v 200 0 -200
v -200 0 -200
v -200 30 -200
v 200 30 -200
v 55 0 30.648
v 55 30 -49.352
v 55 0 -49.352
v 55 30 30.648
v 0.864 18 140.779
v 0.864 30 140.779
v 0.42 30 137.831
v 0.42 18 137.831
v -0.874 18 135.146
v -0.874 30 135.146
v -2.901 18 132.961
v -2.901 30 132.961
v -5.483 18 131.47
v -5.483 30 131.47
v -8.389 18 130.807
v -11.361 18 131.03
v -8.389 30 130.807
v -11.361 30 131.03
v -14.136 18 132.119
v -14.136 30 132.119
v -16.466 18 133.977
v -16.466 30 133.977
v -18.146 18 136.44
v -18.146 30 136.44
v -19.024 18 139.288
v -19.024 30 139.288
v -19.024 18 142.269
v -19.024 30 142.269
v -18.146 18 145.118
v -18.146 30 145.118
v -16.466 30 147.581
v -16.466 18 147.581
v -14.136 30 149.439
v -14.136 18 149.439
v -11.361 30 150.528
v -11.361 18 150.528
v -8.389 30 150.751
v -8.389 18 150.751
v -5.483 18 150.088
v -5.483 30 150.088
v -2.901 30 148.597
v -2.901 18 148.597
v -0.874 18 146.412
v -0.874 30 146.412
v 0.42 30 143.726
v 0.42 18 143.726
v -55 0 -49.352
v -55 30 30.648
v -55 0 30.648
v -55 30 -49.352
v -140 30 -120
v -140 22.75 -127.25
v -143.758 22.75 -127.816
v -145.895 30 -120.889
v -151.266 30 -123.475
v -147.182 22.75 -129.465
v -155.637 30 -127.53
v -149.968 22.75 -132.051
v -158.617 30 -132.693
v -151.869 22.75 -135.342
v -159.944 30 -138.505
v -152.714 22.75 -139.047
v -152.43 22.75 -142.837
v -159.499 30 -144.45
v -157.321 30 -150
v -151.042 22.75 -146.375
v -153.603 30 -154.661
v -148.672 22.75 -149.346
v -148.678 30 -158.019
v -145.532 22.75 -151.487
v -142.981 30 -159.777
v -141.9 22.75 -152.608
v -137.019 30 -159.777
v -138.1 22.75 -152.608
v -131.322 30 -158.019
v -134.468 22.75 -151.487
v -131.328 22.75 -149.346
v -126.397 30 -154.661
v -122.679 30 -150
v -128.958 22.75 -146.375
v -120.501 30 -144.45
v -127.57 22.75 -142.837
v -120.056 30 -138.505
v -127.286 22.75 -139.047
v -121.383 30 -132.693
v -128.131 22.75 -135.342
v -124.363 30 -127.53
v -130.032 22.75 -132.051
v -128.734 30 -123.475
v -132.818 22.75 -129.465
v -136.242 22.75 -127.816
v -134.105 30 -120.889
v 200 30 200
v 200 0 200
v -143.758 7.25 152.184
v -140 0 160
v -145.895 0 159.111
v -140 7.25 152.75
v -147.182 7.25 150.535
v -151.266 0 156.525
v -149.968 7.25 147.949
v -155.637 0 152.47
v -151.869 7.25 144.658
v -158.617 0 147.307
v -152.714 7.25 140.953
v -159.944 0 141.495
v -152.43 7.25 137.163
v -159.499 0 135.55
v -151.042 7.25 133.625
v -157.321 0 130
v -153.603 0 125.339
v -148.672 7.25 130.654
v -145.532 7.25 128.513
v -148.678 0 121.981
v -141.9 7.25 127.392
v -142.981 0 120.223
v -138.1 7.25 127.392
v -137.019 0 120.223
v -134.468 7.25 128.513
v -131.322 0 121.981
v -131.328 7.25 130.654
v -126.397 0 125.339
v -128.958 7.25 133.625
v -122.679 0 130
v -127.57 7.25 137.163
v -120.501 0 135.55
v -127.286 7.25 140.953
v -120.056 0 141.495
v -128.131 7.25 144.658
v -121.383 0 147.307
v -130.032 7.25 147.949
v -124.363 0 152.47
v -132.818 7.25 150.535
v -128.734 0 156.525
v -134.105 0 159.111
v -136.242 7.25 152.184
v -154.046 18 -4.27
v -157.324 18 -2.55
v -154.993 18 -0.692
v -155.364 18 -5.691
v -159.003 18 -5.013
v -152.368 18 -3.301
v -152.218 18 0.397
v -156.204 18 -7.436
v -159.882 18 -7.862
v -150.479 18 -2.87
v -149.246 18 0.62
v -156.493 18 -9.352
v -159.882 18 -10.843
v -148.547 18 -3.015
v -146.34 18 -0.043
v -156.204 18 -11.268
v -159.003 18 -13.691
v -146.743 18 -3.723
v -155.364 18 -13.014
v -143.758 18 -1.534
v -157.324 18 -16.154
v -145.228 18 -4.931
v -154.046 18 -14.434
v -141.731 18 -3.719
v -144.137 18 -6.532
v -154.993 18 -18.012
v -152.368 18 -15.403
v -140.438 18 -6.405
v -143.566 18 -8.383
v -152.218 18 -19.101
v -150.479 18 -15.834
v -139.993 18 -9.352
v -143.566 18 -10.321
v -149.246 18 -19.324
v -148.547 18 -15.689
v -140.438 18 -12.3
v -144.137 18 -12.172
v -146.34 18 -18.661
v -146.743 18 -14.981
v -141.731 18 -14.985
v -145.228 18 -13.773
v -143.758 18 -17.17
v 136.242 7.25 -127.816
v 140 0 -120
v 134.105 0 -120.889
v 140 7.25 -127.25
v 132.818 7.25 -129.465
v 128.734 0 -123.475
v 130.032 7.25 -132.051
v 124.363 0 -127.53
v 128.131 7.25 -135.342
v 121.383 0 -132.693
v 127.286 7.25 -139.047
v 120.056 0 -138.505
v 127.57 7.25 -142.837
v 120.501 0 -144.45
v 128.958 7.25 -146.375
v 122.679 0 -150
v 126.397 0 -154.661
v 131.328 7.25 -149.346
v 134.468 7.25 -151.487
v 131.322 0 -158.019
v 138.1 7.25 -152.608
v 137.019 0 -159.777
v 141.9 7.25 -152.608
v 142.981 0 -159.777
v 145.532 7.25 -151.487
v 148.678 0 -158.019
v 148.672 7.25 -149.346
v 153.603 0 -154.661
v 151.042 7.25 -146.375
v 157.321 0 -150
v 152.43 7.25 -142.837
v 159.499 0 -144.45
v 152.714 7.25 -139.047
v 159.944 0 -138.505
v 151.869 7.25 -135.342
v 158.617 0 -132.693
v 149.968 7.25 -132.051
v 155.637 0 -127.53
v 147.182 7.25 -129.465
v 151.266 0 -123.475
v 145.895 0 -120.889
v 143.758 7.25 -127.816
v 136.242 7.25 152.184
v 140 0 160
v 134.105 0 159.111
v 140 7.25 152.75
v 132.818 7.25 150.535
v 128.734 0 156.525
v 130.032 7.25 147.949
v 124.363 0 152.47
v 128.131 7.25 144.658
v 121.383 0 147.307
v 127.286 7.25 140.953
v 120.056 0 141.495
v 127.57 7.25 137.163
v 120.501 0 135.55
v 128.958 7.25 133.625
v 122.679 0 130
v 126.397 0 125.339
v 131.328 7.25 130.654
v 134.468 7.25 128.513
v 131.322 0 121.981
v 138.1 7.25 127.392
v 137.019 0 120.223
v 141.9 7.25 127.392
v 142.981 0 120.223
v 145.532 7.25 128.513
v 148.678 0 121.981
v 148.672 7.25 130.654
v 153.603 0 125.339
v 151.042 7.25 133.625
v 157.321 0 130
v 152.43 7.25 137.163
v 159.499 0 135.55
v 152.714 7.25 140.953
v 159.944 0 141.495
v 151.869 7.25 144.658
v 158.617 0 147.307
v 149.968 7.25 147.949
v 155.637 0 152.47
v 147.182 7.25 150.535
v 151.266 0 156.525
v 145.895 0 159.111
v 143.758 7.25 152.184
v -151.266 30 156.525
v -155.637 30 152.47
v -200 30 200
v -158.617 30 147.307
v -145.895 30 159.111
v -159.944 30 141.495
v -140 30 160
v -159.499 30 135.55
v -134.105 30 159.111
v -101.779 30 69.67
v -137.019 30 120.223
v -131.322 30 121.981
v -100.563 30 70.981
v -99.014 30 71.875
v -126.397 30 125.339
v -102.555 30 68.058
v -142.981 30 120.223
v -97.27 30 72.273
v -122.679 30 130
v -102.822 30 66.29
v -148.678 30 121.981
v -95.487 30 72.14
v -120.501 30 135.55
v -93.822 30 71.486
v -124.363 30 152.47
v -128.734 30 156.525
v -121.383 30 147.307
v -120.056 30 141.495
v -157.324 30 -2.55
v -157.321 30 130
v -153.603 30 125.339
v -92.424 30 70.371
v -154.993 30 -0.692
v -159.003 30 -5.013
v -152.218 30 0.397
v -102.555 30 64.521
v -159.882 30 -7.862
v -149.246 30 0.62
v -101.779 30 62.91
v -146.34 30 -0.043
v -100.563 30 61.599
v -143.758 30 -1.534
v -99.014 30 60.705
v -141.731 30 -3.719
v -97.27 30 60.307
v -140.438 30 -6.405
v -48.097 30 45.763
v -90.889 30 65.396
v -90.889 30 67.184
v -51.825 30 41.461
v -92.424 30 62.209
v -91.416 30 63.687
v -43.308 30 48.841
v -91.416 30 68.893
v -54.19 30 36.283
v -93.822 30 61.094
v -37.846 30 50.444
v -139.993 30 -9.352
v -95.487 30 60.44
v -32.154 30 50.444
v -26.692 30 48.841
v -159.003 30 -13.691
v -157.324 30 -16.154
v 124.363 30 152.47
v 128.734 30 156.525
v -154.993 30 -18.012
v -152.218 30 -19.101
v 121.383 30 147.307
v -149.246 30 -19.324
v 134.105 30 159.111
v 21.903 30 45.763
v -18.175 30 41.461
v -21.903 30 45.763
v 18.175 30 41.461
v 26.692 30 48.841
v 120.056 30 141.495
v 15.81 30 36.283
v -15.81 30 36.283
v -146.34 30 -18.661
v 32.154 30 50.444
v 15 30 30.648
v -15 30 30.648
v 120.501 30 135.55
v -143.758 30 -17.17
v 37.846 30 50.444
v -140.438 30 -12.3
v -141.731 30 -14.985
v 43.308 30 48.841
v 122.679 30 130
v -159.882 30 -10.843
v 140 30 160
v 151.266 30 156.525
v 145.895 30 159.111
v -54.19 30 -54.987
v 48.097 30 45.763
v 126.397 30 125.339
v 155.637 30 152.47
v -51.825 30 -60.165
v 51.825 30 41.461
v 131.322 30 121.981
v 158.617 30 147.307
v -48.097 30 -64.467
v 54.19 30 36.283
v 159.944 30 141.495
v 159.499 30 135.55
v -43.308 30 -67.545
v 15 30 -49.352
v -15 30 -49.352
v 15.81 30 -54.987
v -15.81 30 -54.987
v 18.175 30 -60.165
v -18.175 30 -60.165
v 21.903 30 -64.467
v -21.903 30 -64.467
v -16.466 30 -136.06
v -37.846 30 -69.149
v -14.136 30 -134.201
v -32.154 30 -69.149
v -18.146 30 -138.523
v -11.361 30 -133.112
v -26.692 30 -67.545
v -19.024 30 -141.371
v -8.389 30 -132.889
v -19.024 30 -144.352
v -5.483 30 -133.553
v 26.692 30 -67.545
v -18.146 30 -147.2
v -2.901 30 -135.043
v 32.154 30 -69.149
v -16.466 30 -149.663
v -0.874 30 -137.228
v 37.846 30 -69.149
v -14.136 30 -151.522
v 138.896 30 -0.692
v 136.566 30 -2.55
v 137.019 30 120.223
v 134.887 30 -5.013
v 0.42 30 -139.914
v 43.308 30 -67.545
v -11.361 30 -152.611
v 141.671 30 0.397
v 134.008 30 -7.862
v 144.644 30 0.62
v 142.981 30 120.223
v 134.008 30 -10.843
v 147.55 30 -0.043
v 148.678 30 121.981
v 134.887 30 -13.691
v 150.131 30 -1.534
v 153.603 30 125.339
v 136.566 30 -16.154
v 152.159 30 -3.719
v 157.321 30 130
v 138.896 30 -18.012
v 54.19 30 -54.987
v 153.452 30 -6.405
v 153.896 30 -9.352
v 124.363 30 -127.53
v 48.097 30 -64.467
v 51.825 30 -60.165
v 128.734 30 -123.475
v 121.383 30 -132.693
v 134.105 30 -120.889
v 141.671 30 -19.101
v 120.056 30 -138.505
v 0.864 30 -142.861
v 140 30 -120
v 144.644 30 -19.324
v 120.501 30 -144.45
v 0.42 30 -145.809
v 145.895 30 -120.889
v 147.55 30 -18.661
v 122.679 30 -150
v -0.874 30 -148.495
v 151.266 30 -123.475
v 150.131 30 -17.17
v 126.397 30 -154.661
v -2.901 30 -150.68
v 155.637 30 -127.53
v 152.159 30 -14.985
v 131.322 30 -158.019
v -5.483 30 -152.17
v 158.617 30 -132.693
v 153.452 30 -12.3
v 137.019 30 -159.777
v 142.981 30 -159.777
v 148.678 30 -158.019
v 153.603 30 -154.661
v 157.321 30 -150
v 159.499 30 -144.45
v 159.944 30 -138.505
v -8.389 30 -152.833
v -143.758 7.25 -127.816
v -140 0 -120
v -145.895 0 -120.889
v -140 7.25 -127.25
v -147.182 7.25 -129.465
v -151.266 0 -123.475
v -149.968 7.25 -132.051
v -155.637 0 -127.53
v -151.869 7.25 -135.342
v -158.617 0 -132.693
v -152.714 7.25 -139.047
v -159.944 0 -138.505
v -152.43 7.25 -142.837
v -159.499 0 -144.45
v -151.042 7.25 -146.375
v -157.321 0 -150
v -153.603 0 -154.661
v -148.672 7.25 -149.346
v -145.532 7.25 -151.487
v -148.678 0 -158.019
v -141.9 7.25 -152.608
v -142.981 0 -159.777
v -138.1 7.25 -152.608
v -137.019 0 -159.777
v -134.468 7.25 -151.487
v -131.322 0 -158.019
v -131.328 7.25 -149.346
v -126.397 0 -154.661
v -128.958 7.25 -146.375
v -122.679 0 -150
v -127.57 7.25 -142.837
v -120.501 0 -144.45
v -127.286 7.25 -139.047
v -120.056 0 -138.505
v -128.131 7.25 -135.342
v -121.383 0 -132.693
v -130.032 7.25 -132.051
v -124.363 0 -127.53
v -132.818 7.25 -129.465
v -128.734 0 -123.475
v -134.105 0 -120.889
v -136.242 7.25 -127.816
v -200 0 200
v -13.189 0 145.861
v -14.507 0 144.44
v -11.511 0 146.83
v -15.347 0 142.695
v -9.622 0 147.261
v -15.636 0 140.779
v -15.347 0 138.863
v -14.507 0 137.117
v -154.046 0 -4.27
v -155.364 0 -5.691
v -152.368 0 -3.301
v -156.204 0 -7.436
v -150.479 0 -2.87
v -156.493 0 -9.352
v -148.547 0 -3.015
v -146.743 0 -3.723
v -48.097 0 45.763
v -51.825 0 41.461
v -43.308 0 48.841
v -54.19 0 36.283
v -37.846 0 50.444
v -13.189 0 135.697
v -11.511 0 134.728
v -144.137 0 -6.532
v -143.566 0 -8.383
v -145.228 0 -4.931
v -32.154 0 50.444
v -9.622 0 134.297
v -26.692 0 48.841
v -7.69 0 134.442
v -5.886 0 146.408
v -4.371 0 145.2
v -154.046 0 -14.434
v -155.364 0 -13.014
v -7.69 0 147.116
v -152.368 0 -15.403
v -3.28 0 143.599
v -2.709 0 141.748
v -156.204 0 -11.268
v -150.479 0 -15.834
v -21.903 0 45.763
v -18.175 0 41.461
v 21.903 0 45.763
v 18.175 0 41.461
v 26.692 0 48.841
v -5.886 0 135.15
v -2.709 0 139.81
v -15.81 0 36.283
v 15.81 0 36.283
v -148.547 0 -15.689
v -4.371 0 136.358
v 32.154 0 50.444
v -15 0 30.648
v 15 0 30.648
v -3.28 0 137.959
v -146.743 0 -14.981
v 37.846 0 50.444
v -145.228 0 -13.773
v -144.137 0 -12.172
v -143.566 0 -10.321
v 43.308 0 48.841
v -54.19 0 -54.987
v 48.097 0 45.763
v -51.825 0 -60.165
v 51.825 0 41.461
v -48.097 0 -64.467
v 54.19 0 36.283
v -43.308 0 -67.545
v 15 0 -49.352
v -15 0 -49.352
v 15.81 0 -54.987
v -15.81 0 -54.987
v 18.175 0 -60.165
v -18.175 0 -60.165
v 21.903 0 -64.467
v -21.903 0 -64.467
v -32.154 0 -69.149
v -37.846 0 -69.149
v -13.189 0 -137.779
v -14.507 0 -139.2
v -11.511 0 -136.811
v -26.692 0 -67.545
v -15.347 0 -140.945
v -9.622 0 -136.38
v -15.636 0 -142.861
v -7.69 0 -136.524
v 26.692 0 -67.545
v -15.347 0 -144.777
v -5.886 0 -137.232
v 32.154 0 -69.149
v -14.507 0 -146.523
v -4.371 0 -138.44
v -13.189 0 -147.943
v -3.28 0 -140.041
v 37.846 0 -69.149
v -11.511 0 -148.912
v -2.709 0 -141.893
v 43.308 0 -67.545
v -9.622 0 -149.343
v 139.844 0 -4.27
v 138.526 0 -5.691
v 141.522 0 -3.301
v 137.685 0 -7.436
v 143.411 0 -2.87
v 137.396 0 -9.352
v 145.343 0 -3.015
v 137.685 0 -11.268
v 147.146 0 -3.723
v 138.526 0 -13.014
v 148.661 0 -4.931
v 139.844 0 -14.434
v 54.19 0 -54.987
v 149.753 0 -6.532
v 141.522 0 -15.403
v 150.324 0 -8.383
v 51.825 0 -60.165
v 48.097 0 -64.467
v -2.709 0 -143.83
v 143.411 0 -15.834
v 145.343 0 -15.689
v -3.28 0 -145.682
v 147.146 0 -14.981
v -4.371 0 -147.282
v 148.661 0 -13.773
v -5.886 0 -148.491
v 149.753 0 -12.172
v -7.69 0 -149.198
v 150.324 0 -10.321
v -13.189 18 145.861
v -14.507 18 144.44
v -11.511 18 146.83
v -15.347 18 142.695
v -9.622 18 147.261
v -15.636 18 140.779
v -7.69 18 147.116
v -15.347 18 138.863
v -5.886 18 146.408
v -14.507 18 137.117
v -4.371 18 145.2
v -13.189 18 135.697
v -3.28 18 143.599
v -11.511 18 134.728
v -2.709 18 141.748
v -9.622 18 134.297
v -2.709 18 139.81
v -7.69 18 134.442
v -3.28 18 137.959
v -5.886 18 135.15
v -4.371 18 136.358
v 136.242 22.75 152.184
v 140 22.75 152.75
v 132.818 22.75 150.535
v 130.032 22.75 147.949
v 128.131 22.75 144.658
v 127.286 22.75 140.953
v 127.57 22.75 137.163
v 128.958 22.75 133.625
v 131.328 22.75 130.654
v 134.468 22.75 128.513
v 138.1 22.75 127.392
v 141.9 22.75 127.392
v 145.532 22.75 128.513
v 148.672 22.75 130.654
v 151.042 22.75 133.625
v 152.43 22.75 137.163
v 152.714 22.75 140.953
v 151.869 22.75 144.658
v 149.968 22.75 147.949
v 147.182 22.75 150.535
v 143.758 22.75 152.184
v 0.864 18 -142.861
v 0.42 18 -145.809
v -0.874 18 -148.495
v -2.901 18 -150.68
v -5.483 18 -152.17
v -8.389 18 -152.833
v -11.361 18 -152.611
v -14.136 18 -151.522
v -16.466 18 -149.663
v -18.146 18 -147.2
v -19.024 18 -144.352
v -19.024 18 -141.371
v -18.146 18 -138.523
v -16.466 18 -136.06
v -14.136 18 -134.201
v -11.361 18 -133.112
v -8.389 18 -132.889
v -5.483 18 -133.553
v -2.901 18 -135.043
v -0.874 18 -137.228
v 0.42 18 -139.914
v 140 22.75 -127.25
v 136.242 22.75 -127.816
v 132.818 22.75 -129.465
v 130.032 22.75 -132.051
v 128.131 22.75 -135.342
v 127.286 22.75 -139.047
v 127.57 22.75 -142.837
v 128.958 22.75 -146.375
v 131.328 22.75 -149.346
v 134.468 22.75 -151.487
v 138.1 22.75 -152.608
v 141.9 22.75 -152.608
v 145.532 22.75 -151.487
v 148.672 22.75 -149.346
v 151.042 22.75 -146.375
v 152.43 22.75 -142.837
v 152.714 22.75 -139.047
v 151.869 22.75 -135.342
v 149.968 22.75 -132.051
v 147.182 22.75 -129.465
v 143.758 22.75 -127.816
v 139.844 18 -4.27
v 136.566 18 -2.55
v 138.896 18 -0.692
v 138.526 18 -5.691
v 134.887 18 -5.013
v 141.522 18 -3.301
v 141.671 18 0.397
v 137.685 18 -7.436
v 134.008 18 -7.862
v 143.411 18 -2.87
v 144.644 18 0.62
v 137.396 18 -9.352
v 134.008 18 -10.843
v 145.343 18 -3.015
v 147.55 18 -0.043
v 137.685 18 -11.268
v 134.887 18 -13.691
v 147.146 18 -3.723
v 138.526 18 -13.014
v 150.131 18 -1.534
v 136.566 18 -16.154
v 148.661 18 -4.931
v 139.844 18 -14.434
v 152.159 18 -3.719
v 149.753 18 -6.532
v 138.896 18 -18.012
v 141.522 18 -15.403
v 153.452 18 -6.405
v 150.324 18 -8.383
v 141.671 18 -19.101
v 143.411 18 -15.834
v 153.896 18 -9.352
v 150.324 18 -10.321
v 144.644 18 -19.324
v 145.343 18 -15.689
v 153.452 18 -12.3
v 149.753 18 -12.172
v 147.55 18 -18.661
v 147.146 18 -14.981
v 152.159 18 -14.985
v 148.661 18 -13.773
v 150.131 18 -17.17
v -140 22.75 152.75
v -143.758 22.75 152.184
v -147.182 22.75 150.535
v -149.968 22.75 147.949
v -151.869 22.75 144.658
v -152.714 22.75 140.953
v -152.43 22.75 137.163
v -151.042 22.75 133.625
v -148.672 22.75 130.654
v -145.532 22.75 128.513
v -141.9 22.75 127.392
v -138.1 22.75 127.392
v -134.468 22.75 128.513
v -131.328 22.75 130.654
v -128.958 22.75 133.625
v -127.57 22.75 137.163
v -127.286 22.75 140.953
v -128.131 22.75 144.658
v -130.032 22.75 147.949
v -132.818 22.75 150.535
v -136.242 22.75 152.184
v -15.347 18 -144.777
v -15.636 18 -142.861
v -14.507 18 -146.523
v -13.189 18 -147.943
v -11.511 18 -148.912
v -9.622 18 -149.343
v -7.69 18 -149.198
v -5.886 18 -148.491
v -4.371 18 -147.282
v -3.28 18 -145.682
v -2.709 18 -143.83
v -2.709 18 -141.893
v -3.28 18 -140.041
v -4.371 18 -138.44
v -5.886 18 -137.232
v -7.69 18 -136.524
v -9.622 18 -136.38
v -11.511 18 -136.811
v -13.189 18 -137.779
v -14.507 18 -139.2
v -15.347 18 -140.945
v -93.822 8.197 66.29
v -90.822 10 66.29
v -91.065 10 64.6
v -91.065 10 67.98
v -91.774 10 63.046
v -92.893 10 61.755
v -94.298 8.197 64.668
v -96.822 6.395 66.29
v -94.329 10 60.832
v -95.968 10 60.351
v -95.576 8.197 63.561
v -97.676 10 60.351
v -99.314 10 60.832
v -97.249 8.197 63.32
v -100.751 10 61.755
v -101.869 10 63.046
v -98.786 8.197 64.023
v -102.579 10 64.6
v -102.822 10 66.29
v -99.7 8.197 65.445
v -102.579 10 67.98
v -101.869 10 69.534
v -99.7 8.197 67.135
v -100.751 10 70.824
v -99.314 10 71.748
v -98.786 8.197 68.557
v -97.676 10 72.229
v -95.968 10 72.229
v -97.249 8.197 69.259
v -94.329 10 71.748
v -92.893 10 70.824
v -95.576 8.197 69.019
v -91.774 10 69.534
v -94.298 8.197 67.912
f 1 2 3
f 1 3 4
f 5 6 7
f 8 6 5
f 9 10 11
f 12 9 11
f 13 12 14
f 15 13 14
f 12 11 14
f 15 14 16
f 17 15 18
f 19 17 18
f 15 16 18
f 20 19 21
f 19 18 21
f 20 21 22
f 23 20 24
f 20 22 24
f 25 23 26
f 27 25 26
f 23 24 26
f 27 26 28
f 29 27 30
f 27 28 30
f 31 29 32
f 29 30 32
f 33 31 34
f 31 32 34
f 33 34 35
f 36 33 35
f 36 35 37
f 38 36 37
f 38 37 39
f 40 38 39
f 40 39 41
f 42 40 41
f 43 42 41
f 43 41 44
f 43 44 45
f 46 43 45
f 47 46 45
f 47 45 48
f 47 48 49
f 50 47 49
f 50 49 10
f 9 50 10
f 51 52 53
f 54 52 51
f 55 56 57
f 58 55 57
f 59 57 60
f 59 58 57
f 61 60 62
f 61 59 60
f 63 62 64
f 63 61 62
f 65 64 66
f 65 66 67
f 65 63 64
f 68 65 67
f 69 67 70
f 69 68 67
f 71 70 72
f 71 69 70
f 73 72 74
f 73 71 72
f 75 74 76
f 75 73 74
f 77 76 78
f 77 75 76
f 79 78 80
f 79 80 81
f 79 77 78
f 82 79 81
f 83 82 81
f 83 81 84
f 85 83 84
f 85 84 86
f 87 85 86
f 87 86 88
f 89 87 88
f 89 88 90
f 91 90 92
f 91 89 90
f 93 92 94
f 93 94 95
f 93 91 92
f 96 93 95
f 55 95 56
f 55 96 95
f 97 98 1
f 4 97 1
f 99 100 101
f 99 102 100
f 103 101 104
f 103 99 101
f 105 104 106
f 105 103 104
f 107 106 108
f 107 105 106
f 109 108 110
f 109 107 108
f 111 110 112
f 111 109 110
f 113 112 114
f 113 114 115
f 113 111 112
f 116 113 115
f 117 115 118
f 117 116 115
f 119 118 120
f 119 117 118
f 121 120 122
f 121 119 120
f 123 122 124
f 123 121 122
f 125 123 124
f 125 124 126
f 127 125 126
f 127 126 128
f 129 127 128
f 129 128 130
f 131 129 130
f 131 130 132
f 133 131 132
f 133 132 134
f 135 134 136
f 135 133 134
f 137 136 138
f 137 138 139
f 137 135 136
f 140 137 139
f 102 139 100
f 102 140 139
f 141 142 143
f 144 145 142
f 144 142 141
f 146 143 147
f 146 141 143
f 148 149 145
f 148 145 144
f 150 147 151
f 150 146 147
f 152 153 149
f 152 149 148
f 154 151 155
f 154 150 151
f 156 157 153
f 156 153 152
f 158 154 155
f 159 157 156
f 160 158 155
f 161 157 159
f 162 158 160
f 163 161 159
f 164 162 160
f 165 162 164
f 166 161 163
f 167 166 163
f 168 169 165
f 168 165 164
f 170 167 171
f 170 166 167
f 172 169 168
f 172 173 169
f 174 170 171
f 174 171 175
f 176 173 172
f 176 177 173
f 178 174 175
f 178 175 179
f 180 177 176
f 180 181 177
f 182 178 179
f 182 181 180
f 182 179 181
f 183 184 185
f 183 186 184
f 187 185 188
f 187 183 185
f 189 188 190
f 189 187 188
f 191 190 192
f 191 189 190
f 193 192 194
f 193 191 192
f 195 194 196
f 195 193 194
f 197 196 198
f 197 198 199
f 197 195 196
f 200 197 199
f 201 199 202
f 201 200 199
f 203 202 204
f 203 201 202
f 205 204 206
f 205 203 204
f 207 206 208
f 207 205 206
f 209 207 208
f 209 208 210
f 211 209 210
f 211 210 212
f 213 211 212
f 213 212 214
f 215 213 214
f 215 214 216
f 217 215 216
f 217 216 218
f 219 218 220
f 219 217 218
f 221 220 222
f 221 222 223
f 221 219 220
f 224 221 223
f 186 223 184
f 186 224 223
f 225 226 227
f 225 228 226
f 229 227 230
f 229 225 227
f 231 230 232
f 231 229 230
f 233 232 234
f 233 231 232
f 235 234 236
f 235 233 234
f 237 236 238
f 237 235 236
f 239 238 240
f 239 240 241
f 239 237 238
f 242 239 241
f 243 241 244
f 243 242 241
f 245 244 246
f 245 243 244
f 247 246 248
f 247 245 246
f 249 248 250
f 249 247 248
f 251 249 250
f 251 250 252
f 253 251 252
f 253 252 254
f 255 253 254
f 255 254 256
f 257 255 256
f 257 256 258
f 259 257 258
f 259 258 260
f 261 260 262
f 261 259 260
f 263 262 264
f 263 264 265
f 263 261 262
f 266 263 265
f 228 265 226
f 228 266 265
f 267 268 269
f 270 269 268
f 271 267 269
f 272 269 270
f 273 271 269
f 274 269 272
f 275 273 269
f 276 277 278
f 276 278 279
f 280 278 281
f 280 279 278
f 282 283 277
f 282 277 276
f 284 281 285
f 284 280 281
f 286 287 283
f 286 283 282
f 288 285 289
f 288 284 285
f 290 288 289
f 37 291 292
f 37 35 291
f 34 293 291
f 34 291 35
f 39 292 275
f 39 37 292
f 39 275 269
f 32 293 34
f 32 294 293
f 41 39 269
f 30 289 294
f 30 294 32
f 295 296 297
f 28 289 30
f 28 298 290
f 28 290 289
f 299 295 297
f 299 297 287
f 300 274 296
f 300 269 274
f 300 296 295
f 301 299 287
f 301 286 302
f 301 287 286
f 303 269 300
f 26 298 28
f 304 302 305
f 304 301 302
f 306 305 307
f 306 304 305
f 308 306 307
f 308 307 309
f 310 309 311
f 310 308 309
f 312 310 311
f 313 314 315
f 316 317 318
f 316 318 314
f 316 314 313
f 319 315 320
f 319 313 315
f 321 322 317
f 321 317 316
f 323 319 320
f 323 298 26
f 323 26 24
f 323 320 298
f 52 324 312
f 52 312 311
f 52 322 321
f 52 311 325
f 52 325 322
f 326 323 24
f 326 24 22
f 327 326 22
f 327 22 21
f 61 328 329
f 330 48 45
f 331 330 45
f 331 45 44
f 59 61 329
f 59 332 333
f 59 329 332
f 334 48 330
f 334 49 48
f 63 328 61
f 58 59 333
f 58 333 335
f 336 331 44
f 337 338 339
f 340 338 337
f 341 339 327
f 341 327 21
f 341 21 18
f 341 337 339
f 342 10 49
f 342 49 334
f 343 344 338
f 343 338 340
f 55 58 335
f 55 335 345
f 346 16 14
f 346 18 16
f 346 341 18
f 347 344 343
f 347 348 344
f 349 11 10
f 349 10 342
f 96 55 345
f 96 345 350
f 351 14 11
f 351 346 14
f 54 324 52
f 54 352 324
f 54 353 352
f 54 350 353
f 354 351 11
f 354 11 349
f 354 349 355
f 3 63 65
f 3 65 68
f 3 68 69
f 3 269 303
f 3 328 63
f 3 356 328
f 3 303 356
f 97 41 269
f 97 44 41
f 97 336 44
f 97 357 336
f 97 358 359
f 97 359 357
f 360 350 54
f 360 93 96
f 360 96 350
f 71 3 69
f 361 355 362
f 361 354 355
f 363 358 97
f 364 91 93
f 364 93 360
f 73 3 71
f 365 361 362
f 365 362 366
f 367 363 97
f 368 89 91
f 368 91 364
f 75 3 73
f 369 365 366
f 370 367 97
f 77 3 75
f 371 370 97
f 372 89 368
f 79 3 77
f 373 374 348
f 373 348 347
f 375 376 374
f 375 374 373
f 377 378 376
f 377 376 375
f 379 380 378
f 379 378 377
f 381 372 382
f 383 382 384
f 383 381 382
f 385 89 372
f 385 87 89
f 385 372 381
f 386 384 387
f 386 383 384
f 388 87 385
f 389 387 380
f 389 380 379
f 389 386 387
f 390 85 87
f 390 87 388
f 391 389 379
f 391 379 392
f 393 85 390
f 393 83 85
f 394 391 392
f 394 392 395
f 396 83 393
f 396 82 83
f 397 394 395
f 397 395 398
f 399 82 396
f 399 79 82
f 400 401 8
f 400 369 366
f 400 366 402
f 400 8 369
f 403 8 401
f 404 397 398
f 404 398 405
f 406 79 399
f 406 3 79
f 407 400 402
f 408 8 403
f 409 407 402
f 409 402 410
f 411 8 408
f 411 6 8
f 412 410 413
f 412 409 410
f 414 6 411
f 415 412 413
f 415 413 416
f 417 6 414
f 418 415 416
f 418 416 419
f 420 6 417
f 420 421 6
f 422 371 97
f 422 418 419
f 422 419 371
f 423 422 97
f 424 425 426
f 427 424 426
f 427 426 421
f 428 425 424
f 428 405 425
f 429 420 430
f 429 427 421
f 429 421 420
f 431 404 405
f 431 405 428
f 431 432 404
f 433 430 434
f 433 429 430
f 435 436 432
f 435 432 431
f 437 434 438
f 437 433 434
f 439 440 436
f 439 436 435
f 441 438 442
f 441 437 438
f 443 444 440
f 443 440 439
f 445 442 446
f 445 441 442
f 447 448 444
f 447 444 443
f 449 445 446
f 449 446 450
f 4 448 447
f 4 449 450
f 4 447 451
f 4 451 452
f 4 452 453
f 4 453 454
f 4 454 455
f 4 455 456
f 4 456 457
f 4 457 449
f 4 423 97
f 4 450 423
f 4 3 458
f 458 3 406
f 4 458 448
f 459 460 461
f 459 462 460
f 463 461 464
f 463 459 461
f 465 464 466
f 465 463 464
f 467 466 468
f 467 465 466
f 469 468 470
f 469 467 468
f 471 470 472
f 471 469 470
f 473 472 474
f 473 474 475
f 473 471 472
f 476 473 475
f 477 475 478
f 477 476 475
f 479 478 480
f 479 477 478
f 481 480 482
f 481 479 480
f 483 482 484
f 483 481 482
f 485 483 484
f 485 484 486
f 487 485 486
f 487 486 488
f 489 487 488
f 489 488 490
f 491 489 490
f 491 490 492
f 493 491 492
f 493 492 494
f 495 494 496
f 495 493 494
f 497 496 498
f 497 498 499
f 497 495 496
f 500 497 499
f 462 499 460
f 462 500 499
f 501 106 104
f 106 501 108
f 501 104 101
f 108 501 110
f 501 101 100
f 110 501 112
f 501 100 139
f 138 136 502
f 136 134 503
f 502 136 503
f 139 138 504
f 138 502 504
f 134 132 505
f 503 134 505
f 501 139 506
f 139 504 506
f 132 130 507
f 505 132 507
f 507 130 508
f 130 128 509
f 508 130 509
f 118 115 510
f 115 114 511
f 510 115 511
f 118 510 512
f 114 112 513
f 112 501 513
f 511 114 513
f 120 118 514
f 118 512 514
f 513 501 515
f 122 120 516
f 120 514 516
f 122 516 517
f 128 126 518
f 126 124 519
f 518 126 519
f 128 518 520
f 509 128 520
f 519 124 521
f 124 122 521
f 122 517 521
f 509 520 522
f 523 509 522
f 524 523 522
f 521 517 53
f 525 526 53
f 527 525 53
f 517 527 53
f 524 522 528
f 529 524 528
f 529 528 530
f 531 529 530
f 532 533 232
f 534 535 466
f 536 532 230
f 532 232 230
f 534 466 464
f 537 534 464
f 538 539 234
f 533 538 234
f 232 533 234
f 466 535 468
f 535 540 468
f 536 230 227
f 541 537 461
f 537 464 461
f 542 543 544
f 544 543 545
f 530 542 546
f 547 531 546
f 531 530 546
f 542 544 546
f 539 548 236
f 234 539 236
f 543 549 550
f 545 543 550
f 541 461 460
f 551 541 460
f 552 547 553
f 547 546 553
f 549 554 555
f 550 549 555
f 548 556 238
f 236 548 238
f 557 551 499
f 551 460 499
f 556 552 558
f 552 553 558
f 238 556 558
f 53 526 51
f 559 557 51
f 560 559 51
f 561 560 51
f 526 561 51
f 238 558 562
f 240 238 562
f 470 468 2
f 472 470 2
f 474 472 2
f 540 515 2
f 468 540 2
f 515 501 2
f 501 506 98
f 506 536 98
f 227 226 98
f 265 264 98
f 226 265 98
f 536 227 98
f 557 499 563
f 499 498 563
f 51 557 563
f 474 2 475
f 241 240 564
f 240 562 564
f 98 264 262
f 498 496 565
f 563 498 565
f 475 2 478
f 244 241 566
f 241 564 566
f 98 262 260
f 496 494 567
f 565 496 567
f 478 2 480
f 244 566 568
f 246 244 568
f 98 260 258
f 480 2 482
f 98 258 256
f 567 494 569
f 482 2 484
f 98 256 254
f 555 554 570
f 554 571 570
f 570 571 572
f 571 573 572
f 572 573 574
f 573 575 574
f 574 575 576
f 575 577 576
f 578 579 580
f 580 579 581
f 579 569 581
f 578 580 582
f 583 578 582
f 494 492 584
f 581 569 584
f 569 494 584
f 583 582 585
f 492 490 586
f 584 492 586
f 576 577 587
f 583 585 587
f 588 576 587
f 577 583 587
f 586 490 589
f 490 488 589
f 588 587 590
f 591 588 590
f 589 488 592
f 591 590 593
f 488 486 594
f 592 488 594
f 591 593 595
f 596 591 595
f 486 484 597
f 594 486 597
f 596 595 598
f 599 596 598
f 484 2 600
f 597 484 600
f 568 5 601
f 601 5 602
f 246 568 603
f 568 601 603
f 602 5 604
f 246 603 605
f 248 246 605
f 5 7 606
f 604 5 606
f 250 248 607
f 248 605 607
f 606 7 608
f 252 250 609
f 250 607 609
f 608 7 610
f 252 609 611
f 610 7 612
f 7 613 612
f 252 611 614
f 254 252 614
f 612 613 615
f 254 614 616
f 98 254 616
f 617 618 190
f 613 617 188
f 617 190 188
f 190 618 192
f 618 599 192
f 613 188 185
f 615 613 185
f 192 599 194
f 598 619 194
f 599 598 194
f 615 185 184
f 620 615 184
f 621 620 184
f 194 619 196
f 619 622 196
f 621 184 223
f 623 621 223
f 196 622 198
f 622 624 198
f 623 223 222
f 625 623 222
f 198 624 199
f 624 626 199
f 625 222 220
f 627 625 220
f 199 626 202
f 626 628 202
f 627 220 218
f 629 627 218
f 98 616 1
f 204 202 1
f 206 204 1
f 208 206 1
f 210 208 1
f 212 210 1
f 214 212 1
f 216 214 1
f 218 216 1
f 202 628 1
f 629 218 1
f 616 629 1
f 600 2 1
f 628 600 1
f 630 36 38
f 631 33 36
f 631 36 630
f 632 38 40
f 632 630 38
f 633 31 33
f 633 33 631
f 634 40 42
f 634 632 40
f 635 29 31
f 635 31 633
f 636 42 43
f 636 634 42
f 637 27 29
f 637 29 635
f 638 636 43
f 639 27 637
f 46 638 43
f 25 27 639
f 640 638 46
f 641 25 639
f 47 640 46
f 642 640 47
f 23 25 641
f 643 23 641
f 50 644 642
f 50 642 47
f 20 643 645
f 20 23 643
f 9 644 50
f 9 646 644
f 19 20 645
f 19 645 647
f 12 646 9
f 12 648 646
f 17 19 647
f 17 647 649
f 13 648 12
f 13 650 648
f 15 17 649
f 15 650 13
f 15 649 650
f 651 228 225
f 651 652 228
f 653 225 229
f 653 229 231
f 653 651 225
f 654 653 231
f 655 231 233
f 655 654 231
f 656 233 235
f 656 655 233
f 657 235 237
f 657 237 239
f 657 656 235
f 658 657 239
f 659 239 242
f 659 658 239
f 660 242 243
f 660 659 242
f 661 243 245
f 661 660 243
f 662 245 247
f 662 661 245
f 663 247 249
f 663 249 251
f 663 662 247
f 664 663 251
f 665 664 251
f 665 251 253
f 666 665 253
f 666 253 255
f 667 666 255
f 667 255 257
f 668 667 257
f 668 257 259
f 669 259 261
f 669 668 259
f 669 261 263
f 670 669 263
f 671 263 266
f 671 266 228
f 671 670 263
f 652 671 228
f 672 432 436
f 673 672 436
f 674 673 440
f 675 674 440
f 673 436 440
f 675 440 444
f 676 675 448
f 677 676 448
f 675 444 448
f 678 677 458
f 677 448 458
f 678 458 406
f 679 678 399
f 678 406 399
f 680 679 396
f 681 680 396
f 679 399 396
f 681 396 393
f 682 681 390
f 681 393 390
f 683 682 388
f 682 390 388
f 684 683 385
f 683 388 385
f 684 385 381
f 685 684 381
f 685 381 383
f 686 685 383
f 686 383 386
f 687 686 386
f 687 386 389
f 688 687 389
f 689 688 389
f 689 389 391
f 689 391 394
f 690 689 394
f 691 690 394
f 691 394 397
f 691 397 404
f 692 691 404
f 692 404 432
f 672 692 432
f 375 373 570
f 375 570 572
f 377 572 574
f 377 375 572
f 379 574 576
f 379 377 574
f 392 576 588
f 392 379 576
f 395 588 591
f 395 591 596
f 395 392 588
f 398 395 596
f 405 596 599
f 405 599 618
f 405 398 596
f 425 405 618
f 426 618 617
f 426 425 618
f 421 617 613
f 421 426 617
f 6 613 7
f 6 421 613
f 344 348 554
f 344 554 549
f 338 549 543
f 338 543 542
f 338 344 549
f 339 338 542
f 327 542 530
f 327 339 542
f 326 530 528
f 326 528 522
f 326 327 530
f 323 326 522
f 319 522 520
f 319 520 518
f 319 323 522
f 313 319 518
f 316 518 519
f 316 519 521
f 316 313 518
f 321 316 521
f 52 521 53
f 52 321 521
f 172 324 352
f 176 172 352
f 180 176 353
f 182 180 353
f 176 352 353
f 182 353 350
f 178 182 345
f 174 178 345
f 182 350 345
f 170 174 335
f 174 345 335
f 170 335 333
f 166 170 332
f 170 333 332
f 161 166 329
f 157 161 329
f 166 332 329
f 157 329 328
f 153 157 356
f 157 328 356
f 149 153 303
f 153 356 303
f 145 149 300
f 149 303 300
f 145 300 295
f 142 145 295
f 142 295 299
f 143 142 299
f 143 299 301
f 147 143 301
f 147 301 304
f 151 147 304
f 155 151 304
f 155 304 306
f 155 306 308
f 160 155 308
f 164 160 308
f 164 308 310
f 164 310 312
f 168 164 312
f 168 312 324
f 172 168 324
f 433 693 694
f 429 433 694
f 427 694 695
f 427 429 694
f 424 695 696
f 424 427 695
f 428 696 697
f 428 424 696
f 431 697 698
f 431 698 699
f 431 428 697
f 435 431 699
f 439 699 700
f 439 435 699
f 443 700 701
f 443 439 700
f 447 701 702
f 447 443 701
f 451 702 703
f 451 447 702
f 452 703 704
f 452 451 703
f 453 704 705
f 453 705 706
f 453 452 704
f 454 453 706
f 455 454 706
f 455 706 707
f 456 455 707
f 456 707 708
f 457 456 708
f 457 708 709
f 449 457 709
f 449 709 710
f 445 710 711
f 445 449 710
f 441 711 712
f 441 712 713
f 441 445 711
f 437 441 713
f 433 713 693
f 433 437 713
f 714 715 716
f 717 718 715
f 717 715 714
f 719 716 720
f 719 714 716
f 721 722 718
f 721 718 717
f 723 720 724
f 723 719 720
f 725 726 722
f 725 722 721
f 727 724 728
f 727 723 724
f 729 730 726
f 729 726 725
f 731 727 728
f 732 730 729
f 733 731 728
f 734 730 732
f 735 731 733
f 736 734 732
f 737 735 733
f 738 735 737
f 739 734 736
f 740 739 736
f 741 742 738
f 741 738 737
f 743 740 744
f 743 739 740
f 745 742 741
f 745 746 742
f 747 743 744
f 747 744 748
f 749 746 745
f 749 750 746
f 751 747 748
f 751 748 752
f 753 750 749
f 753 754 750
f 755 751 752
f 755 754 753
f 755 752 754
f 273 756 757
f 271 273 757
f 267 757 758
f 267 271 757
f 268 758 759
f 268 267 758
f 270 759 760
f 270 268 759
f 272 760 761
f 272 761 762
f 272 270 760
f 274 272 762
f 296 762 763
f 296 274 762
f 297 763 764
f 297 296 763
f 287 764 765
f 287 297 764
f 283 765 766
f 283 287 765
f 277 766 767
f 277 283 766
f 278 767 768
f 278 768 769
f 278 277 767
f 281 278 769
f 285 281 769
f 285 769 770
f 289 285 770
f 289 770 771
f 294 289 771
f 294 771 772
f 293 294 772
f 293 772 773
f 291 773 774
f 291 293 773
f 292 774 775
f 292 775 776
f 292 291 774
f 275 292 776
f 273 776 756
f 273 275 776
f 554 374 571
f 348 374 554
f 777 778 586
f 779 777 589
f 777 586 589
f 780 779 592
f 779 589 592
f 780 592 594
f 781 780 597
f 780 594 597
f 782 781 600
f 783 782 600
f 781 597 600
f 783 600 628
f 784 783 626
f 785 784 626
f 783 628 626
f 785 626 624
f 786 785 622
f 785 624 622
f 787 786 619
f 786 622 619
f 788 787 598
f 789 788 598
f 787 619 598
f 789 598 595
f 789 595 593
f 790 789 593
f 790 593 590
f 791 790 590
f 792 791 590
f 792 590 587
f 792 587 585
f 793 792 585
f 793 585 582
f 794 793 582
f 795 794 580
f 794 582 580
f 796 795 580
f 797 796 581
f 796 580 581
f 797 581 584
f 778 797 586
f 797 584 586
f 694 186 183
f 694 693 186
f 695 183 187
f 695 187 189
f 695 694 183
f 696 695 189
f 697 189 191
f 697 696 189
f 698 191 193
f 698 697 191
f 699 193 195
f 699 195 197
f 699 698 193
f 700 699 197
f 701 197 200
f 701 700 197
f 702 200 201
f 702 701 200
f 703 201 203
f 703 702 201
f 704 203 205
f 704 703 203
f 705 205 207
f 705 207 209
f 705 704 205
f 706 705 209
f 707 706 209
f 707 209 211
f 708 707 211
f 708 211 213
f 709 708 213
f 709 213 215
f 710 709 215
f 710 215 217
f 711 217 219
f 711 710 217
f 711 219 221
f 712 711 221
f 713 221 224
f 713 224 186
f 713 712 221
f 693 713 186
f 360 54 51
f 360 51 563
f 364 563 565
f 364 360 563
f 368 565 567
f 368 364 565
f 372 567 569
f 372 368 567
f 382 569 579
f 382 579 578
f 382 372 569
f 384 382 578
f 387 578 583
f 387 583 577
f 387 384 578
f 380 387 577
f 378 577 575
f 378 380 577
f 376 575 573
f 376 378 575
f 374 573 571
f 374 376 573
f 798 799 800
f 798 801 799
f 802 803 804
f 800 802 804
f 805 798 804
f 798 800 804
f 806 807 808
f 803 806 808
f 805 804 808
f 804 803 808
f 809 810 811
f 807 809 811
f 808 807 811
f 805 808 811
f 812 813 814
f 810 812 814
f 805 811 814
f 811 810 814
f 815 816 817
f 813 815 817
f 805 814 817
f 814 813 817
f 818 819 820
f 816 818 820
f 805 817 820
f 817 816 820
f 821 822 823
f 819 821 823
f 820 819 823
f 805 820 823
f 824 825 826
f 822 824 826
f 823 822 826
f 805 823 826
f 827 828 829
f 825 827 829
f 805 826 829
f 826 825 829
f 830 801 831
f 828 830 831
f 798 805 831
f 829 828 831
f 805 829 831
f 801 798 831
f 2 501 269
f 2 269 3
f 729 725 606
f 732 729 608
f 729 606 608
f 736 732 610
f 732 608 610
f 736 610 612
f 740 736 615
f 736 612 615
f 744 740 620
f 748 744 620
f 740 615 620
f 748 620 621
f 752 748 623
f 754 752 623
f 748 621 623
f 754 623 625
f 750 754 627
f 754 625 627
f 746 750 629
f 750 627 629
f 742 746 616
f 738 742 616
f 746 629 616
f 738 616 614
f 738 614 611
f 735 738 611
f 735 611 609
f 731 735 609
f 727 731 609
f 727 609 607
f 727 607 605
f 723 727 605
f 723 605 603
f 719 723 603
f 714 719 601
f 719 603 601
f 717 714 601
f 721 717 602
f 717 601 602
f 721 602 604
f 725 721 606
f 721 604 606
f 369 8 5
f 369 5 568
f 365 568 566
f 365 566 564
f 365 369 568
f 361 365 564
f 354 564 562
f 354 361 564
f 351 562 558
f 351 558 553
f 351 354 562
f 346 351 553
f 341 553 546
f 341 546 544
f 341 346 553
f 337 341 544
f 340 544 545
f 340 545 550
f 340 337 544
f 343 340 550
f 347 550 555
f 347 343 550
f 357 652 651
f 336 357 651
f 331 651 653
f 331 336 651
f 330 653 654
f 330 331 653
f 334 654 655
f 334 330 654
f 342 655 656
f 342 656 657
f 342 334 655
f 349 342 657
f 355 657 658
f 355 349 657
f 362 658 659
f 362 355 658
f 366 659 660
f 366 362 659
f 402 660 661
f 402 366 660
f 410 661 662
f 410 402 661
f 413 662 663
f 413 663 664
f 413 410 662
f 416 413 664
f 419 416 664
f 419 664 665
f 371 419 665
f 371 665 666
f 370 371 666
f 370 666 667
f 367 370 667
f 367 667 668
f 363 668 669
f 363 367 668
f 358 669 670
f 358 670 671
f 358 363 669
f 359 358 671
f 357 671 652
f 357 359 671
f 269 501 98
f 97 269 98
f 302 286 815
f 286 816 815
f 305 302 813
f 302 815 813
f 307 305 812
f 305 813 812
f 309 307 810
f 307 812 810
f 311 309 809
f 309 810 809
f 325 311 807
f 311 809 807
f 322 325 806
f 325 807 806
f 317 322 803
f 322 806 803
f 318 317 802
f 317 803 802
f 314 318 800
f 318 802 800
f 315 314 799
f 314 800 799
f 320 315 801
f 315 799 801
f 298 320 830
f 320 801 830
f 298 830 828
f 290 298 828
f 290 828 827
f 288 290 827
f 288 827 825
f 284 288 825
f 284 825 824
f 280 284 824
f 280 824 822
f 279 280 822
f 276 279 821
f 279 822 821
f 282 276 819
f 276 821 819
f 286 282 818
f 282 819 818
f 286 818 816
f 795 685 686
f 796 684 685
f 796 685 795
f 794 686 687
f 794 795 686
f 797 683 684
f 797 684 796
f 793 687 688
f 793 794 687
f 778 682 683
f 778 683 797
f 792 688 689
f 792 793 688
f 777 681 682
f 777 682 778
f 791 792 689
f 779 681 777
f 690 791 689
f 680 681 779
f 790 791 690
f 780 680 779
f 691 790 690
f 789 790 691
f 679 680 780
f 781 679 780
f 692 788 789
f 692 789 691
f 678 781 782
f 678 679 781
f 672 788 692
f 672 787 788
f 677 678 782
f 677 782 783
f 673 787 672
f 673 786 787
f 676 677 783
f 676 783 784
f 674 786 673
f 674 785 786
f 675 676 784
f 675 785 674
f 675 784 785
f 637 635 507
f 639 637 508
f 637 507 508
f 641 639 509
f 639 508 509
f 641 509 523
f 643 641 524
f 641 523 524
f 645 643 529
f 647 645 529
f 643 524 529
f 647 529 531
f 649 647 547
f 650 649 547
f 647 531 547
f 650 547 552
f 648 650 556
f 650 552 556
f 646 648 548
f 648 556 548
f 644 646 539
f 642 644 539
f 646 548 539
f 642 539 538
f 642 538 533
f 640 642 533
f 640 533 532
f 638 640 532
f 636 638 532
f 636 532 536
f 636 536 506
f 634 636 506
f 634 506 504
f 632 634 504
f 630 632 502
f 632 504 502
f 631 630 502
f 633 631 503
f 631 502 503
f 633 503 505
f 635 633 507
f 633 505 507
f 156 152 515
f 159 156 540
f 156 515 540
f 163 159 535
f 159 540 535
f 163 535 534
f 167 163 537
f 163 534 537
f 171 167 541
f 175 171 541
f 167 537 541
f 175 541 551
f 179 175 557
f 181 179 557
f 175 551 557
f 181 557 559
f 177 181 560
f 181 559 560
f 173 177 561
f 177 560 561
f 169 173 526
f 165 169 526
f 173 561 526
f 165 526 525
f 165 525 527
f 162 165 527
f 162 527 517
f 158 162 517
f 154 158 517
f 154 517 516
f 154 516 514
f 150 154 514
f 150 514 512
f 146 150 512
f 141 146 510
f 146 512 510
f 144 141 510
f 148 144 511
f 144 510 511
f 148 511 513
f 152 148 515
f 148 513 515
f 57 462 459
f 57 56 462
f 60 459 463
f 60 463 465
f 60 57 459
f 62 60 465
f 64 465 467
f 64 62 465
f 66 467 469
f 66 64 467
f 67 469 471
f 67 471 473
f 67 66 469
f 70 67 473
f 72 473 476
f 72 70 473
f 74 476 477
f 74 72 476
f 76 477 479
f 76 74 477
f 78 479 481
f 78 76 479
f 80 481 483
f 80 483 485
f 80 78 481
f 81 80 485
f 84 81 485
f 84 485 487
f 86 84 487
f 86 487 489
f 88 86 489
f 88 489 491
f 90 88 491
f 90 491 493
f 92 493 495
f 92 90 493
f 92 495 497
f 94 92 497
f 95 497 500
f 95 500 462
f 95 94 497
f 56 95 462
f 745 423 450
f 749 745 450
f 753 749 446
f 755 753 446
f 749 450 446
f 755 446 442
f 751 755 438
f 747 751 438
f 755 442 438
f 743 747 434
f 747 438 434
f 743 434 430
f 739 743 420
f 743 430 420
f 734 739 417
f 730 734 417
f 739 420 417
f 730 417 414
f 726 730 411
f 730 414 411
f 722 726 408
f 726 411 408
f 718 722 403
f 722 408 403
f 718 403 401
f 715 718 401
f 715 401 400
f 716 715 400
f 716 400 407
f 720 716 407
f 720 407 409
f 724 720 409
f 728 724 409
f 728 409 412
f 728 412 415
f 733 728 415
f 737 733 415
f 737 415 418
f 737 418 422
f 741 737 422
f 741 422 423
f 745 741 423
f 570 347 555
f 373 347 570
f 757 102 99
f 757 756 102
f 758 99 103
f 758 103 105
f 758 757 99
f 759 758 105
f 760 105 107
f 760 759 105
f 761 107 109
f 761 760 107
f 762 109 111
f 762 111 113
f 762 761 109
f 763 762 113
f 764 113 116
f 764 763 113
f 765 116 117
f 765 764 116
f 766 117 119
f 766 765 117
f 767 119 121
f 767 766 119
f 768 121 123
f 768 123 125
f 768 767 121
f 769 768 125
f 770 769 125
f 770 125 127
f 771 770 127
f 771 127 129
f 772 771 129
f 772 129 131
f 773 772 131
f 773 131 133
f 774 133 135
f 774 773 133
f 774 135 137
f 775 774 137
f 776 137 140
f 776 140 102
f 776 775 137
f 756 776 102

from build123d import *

# Parameters (mm, degrees)
IZIM1_W                          = 400
IZIM1_H                          = 400
Y_KSEKLIK_EKSTR_ZYON1_DEPTH      = 30
F_25_5_25_5_AP_DELIK1_AT_2_COUNT = 2
F_25_5_25_5_AP_DELIK1_AT_2_PITCH = 280
F_25_5_25_5_AP_DELIK1_AT_3_COUNT = 2
F_25_5_25_5_AP_DELIK1_AT_3_PITCH = 280
F_25_5_25_5_AP_DELIK1_AT_4_COUNT = 2
F_25_5_25_5_AP_DELIK1_AT_4_PITCH = 395.979797464
KES_EKSTR_ZYON3_DEPTH            = 30
M12_SHCS_IN_HAV_A1_D             = 13
M12_SHCS_IN_HAV_A1_CBORE_D       = 20
M12_SHCS_IN_HAV_A1_CBORE_DEPTH   = 12
M14X2_0_DI_LI_DELIK1_D           = 12
M14X2_0_DI_LI_DELIK1_DEPTH       = 20
M14X2_0_DI_LI_DELIK1_TIP         = 3.605163714


with BuildPart() as part:
    # Çizim1 → Yükseklik-Ekstrüzyon1 (new body)
    with BuildSketch(Plane(origin=(0, 0, 0), x_dir=(1, 0, 0), z_dir=(0, 1, 0))):
        Rectangle(IZIM1_W, IZIM1_H)
    extrude(amount=Y_KSEKLIK_EKSTR_ZYON1_DEPTH)

    # Çizim3 → Ø25.5 (25.5) Çap Delik1 (revolve, cut)
    with BuildSketch(Plane(origin=(-140, 30, 140), x_dir=(0, 0, 1), z_dir=(1, 0, 0))):
        Polygon((0, 0), (0, 30), (20, 30), (12.75, 22.75), (12.75, 7.25), (20, 0), align=None)
    f_25_5_25_5_ap_delik1 = revolve(axis=Axis((-140, 36.35, 140), (0, -1, 0)), mode=Mode.SUBTRACT)

    # Ø25.5 (25.5) Çap Delik1 at 2: Ø25.5 (25.5) Çap Delik1 ×2
    with Locations(*[(0, 0, -i * F_25_5_25_5_AP_DELIK1_AT_2_PITCH) for i in range(1, F_25_5_25_5_AP_DELIK1_AT_2_COUNT)]):
        add(f_25_5_25_5_ap_delik1, mode=Mode.SUBTRACT)

    # Ø25.5 (25.5) Çap Delik1 at 3: Ø25.5 (25.5) Çap Delik1 ×2
    with Locations(*[(i * F_25_5_25_5_AP_DELIK1_AT_3_PITCH, 0, 0) for i in range(1, F_25_5_25_5_AP_DELIK1_AT_3_COUNT)]):
        add(f_25_5_25_5_ap_delik1, mode=Mode.SUBTRACT)

    # Ø25.5 (25.5) Çap Delik1 at 4: Ø25.5 (25.5) Çap Delik1 ×2
    with Locations(*[Vector(0.7071067811865476, 0, -0.7071067811865476) * (i * F_25_5_25_5_AP_DELIK1_AT_4_PITCH) for i in range(1, F_25_5_25_5_AP_DELIK1_AT_4_COUNT)]):
        add(f_25_5_25_5_ap_delik1, mode=Mode.SUBTRACT)

    # Çizim4 → Kes-Ekstrüzyon3 (cut)
    with BuildSketch(Plane(origin=(0, 30, 0), x_dir=(1, 0, 0), z_dir=(0, 1, 0))):
        with BuildLine():
            Line((-15, 49.352110618), (-15, -30.647889382))
            ThreePointArc((-15, -30.647889382), (-35, -50.647889382), (-55, -30.647889382))
            Line((-55, -30.647889382), (-55, 49.352110618))
            ThreePointArc((-55, 49.352110618), (-35, 69.352110618), (-15, 49.352110618))
        make_face()
        with BuildLine():
            Line((55, 49.352110618), (55, -30.647889382))
            ThreePointArc((55, -30.647889382), (35, -50.647889382), (15, -30.647889382))
            Line((15, -30.647889382), (15, 49.352110618))
            ThreePointArc((15, 49.352110618), (35, 69.352110618), (55, 49.352110618))
        make_face()
    extrude(amount=-KES_EKSTR_ZYON3_DEPTH, mode=Mode.SUBTRACT)

    # M12 SHCS İçin Havşa1 (through all)
    with Locations(Plane(origin=(0, 30, 0), x_dir=(1, 0, 0), z_dir=(0, 1, 0))):
        with Locations((-9.135973947, -140.778837954), (-149.99326257, 9.352110618), (-9.135973947, 142.861352041), (143.896335676, 9.352110618)):
            CounterBoreHole(M12_SHCS_IN_HAV_A1_D / 2, M12_SHCS_IN_HAV_A1_CBORE_D / 2, M12_SHCS_IN_HAV_A1_CBORE_DEPTH)

    # M14x2.0 Dişli Delik1
    with Locations(Plane(origin=(0, 30, 0), x_dir=(1, 0, 0), z_dir=(0, 1, 0))):
        with Locations((-96.821851103, -66.289960557)):
            Hole(M14X2_0_DI_LI_DELIK1_D / 2, depth=M14X2_0_DI_LI_DELIK1_DEPTH)
            with Locations((0, 0, -(M14X2_0_DI_LI_DELIK1_DEPTH + M14X2_0_DI_LI_DELIK1_TIP / 2))):  # 118° drill point
                Cone(0, M14X2_0_DI_LI_DELIK1_D / 2, M14X2_0_DI_LI_DELIK1_TIP, mode=Mode.SUBTRACT)


solid = part.part
